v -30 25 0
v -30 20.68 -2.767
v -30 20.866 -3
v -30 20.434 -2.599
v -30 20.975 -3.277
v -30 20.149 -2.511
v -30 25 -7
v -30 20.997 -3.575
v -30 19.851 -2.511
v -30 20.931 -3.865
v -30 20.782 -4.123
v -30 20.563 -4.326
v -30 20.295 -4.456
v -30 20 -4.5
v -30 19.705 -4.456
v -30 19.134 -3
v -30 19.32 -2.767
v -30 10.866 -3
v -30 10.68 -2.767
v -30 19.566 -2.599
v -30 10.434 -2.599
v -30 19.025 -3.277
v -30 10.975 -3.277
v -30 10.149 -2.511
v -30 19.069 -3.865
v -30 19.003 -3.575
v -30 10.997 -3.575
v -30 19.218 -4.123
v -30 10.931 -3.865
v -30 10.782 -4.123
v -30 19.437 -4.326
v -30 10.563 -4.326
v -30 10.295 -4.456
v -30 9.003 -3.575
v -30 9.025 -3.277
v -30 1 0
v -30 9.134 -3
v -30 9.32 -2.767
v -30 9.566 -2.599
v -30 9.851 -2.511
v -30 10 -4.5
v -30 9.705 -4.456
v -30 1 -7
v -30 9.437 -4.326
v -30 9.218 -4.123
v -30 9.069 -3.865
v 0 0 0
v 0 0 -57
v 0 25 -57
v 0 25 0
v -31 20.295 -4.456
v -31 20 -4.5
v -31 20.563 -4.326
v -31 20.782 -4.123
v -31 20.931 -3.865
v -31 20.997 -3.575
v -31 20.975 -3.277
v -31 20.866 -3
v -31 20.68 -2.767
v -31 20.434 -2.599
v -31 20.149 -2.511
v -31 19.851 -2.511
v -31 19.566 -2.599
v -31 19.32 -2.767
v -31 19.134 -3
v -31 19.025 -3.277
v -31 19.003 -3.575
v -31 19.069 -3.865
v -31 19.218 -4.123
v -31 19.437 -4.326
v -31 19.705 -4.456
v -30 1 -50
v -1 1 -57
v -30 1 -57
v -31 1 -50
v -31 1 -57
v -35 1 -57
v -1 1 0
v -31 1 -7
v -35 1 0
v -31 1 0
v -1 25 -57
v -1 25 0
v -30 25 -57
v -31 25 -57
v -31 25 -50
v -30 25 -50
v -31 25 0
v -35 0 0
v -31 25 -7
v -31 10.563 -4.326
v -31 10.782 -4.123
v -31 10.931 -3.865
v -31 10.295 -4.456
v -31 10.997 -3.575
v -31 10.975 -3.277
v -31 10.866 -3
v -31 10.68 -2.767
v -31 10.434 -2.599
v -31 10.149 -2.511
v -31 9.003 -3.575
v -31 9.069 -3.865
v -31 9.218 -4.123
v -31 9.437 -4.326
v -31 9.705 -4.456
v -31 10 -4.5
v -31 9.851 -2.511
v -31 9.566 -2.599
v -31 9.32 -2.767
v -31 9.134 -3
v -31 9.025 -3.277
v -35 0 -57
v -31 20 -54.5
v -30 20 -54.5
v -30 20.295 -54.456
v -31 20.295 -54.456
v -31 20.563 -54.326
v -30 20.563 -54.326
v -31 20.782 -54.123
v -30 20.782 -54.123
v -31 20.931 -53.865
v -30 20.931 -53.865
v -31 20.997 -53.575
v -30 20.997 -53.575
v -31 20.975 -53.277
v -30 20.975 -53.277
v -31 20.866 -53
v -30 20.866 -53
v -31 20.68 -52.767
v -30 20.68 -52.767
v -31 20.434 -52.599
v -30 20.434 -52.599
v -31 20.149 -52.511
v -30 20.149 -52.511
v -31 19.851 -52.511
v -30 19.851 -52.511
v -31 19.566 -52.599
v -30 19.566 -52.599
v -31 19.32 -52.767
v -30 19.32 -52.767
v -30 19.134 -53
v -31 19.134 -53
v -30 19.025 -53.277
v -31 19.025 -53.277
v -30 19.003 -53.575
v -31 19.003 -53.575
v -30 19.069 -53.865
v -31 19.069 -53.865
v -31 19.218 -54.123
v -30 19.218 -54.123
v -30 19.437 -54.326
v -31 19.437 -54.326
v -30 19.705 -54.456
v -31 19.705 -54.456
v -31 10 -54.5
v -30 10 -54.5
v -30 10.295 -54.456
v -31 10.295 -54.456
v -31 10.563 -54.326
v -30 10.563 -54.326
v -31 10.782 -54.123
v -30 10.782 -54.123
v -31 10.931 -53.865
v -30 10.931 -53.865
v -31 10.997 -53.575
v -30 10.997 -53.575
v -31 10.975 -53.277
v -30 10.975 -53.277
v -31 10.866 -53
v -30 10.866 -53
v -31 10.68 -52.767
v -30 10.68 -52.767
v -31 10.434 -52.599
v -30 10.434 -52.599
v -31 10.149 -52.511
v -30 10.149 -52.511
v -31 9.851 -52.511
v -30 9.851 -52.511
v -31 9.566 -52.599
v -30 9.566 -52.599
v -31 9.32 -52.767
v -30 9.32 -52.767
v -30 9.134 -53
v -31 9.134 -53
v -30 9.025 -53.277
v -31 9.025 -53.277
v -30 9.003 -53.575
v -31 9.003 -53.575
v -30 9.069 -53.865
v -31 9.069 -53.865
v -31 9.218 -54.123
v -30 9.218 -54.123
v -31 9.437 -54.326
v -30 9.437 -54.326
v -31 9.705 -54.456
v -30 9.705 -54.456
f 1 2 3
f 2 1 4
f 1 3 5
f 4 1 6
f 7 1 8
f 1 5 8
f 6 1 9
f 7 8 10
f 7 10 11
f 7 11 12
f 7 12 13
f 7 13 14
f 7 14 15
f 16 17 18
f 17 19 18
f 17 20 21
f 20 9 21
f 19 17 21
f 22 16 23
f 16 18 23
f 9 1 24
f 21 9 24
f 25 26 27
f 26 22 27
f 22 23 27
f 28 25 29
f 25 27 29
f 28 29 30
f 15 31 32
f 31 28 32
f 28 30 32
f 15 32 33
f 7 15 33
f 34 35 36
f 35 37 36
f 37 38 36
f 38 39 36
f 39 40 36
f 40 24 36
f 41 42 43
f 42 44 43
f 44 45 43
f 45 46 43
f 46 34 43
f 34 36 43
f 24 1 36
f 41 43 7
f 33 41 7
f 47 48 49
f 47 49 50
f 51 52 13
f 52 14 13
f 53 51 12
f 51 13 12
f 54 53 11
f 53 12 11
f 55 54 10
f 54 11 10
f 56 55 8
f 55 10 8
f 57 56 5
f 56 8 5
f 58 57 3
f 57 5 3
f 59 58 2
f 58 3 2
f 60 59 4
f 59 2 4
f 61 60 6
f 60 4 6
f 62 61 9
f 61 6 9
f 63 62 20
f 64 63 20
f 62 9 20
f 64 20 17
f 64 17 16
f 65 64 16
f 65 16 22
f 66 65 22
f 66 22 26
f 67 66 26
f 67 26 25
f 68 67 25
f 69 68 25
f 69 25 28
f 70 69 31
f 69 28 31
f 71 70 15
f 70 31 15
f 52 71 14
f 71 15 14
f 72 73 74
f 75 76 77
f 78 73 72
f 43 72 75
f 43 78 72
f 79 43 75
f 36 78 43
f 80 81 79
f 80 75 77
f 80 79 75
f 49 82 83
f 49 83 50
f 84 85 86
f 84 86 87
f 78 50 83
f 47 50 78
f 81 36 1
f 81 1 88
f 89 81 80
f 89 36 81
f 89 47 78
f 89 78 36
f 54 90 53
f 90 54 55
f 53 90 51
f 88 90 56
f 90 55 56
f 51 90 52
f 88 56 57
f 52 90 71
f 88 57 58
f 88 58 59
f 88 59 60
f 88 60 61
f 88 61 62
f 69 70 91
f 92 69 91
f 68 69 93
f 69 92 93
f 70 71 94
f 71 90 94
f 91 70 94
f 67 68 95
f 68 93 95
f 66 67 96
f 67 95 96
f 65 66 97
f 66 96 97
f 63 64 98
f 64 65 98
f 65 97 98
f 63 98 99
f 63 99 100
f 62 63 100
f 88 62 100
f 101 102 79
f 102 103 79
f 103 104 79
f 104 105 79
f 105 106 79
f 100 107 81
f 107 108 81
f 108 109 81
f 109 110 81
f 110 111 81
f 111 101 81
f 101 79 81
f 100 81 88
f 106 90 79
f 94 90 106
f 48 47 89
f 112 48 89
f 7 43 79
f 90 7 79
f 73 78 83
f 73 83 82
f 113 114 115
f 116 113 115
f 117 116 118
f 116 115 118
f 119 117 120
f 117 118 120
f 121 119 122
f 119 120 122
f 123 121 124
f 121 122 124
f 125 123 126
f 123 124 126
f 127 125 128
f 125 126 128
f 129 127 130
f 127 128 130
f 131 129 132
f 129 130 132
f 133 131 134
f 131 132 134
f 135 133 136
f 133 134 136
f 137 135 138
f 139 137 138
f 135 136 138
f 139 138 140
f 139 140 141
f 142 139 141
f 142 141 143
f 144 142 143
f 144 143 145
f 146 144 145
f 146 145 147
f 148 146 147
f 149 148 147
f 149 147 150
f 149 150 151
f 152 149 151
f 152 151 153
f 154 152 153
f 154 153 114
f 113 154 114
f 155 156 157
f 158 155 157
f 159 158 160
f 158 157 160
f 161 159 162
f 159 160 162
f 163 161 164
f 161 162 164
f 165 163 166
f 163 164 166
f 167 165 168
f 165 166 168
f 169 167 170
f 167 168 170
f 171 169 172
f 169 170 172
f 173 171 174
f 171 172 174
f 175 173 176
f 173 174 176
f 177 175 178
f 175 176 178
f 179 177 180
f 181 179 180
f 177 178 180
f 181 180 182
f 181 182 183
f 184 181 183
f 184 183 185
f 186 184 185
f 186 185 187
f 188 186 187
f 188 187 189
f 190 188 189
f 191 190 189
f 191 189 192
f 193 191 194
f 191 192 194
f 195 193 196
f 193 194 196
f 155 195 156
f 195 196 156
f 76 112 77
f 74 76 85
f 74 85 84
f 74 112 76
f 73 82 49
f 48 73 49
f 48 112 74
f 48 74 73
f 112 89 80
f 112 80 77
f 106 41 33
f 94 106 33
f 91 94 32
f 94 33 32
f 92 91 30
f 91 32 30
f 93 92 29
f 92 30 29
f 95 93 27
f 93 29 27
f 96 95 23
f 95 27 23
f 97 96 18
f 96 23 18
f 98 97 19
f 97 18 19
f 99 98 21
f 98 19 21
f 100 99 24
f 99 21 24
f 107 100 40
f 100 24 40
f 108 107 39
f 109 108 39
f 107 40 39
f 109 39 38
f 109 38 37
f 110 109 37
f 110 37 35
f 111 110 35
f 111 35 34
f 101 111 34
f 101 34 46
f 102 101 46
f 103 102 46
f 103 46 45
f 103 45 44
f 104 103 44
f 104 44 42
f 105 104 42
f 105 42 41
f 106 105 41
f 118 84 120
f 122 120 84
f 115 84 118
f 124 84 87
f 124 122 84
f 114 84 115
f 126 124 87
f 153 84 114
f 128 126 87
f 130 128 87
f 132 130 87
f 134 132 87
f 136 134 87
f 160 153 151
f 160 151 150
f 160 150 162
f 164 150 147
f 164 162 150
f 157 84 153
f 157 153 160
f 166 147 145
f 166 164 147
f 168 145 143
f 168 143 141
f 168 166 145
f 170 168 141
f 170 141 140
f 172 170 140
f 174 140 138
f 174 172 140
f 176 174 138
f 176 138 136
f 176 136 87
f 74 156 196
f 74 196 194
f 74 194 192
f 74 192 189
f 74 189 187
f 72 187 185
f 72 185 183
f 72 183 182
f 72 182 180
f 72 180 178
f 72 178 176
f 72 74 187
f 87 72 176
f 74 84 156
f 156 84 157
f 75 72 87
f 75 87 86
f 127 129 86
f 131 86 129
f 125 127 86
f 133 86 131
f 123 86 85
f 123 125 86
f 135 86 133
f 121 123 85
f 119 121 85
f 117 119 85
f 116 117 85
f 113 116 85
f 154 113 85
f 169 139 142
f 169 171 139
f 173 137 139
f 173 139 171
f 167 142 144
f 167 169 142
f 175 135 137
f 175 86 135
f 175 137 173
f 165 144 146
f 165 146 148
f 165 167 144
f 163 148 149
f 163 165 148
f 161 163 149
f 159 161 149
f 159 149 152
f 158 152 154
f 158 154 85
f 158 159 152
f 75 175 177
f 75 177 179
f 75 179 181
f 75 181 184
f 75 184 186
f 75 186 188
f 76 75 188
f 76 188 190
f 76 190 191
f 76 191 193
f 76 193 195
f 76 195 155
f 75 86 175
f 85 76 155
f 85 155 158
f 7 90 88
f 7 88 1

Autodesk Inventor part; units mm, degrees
ref_plane "YZ Plane" through (0, 0, 0) normal (1, 0, 0) x (0, 1, 0)
ref_plane "XZ Plane" through (0, 0, 0) normal (0, 1, 0) x (-1, 0, 0)
ref_plane "XY Plane" through (0, 0, 0) normal (0, 0, 1) x (1, 0, 0)
sketch "Sketch1" plane through (0, 0, 0) normal (0, 1, 0) x (-1, 0, 0)
  line L0 (0, 0) -> (35, 0)
  line L1 (35, 0) -> (35, -57)
  line L2 (35, -57) -> (0, -57)
  line L3 (0, -57) -> (0, 0)
  dimension "d0" = 35
  dimension "d1" = 57
extrude "Extrusion1" add sketch "Sketch1" along normal blind 1
sketch "Sketch2" plane through (0, 1, 0) normal (0, 1, 0) x (1, 0, 0)
  line L0 (-35, 0) -> (0, 0) projected
  line L1 (0, 57) -> (-35, 57) projected
  line L2 (0, 0) -> (-1, 0)
  line L3 (-1, 0) -> (-1, 57)
  line L4 (-1, 57) -> (0, 57)
  line L5 (0, 57) -> (0, 0)
  line L6 (-31, 0) -> (-30, 0)
  line L7 (-30, 0) -> (-30, 7)
  line L8 (-30, 7) -> (-31, 7)
  line L9 (-31, 7) -> (-31, 0)
  line L10 (-31, 57) -> (-30, 57)
  line L11 (-30, 57) -> (-30, 50)
  line L12 (-30, 50) -> (-31, 50)
  line L13 (-31, 50) -> (-31, 57)
  dimension "d4" = 1
  dimension "d5" = 31
  dimension "d6" = 1
  dimension "d7" = 7
  dimension "d8" = 7
extrude "Extrusion2" add sketch "Sketch2" along normal blind 24
sketch "Sketch3" plane through (-30, 1, 0) normal (1, 0, 0) x (0, 0, -1)
  line L0 (0, 24) -> (7, 24) projected
  line L1 (3.5, 24) -> (3.5, 19)
  line L2 (3.5, 19) -> (3.5, 9)
  line L3 (50, 24) -> (57, 24) projected
  line L4 (53.5, 24) -> (53.5, 19)
  line L5 (53.5, 19) -> (53.5, 9)
  circle A0 centre (3.5, 19) radius 1
  circle A1 centre (3.5, 9) radius 1
  circle A2 centre (53.5, 19) radius 1
  circle A3 centre (53.5, 9) radius 1
  point P0 (0, -1)
  dimension "d11" = 5
  dimension "d12" = 10
  dimension "d13" = 5
  dimension "d14" = 10
  dimension "d15" = 2
  dimension "d16" = 2
  dimension "d17" = 2
  dimension "d18" = 2
extrude "Extrusion3" cut sketch "Sketch3" against normal blind 24
properties part number "elbow servo plate"
